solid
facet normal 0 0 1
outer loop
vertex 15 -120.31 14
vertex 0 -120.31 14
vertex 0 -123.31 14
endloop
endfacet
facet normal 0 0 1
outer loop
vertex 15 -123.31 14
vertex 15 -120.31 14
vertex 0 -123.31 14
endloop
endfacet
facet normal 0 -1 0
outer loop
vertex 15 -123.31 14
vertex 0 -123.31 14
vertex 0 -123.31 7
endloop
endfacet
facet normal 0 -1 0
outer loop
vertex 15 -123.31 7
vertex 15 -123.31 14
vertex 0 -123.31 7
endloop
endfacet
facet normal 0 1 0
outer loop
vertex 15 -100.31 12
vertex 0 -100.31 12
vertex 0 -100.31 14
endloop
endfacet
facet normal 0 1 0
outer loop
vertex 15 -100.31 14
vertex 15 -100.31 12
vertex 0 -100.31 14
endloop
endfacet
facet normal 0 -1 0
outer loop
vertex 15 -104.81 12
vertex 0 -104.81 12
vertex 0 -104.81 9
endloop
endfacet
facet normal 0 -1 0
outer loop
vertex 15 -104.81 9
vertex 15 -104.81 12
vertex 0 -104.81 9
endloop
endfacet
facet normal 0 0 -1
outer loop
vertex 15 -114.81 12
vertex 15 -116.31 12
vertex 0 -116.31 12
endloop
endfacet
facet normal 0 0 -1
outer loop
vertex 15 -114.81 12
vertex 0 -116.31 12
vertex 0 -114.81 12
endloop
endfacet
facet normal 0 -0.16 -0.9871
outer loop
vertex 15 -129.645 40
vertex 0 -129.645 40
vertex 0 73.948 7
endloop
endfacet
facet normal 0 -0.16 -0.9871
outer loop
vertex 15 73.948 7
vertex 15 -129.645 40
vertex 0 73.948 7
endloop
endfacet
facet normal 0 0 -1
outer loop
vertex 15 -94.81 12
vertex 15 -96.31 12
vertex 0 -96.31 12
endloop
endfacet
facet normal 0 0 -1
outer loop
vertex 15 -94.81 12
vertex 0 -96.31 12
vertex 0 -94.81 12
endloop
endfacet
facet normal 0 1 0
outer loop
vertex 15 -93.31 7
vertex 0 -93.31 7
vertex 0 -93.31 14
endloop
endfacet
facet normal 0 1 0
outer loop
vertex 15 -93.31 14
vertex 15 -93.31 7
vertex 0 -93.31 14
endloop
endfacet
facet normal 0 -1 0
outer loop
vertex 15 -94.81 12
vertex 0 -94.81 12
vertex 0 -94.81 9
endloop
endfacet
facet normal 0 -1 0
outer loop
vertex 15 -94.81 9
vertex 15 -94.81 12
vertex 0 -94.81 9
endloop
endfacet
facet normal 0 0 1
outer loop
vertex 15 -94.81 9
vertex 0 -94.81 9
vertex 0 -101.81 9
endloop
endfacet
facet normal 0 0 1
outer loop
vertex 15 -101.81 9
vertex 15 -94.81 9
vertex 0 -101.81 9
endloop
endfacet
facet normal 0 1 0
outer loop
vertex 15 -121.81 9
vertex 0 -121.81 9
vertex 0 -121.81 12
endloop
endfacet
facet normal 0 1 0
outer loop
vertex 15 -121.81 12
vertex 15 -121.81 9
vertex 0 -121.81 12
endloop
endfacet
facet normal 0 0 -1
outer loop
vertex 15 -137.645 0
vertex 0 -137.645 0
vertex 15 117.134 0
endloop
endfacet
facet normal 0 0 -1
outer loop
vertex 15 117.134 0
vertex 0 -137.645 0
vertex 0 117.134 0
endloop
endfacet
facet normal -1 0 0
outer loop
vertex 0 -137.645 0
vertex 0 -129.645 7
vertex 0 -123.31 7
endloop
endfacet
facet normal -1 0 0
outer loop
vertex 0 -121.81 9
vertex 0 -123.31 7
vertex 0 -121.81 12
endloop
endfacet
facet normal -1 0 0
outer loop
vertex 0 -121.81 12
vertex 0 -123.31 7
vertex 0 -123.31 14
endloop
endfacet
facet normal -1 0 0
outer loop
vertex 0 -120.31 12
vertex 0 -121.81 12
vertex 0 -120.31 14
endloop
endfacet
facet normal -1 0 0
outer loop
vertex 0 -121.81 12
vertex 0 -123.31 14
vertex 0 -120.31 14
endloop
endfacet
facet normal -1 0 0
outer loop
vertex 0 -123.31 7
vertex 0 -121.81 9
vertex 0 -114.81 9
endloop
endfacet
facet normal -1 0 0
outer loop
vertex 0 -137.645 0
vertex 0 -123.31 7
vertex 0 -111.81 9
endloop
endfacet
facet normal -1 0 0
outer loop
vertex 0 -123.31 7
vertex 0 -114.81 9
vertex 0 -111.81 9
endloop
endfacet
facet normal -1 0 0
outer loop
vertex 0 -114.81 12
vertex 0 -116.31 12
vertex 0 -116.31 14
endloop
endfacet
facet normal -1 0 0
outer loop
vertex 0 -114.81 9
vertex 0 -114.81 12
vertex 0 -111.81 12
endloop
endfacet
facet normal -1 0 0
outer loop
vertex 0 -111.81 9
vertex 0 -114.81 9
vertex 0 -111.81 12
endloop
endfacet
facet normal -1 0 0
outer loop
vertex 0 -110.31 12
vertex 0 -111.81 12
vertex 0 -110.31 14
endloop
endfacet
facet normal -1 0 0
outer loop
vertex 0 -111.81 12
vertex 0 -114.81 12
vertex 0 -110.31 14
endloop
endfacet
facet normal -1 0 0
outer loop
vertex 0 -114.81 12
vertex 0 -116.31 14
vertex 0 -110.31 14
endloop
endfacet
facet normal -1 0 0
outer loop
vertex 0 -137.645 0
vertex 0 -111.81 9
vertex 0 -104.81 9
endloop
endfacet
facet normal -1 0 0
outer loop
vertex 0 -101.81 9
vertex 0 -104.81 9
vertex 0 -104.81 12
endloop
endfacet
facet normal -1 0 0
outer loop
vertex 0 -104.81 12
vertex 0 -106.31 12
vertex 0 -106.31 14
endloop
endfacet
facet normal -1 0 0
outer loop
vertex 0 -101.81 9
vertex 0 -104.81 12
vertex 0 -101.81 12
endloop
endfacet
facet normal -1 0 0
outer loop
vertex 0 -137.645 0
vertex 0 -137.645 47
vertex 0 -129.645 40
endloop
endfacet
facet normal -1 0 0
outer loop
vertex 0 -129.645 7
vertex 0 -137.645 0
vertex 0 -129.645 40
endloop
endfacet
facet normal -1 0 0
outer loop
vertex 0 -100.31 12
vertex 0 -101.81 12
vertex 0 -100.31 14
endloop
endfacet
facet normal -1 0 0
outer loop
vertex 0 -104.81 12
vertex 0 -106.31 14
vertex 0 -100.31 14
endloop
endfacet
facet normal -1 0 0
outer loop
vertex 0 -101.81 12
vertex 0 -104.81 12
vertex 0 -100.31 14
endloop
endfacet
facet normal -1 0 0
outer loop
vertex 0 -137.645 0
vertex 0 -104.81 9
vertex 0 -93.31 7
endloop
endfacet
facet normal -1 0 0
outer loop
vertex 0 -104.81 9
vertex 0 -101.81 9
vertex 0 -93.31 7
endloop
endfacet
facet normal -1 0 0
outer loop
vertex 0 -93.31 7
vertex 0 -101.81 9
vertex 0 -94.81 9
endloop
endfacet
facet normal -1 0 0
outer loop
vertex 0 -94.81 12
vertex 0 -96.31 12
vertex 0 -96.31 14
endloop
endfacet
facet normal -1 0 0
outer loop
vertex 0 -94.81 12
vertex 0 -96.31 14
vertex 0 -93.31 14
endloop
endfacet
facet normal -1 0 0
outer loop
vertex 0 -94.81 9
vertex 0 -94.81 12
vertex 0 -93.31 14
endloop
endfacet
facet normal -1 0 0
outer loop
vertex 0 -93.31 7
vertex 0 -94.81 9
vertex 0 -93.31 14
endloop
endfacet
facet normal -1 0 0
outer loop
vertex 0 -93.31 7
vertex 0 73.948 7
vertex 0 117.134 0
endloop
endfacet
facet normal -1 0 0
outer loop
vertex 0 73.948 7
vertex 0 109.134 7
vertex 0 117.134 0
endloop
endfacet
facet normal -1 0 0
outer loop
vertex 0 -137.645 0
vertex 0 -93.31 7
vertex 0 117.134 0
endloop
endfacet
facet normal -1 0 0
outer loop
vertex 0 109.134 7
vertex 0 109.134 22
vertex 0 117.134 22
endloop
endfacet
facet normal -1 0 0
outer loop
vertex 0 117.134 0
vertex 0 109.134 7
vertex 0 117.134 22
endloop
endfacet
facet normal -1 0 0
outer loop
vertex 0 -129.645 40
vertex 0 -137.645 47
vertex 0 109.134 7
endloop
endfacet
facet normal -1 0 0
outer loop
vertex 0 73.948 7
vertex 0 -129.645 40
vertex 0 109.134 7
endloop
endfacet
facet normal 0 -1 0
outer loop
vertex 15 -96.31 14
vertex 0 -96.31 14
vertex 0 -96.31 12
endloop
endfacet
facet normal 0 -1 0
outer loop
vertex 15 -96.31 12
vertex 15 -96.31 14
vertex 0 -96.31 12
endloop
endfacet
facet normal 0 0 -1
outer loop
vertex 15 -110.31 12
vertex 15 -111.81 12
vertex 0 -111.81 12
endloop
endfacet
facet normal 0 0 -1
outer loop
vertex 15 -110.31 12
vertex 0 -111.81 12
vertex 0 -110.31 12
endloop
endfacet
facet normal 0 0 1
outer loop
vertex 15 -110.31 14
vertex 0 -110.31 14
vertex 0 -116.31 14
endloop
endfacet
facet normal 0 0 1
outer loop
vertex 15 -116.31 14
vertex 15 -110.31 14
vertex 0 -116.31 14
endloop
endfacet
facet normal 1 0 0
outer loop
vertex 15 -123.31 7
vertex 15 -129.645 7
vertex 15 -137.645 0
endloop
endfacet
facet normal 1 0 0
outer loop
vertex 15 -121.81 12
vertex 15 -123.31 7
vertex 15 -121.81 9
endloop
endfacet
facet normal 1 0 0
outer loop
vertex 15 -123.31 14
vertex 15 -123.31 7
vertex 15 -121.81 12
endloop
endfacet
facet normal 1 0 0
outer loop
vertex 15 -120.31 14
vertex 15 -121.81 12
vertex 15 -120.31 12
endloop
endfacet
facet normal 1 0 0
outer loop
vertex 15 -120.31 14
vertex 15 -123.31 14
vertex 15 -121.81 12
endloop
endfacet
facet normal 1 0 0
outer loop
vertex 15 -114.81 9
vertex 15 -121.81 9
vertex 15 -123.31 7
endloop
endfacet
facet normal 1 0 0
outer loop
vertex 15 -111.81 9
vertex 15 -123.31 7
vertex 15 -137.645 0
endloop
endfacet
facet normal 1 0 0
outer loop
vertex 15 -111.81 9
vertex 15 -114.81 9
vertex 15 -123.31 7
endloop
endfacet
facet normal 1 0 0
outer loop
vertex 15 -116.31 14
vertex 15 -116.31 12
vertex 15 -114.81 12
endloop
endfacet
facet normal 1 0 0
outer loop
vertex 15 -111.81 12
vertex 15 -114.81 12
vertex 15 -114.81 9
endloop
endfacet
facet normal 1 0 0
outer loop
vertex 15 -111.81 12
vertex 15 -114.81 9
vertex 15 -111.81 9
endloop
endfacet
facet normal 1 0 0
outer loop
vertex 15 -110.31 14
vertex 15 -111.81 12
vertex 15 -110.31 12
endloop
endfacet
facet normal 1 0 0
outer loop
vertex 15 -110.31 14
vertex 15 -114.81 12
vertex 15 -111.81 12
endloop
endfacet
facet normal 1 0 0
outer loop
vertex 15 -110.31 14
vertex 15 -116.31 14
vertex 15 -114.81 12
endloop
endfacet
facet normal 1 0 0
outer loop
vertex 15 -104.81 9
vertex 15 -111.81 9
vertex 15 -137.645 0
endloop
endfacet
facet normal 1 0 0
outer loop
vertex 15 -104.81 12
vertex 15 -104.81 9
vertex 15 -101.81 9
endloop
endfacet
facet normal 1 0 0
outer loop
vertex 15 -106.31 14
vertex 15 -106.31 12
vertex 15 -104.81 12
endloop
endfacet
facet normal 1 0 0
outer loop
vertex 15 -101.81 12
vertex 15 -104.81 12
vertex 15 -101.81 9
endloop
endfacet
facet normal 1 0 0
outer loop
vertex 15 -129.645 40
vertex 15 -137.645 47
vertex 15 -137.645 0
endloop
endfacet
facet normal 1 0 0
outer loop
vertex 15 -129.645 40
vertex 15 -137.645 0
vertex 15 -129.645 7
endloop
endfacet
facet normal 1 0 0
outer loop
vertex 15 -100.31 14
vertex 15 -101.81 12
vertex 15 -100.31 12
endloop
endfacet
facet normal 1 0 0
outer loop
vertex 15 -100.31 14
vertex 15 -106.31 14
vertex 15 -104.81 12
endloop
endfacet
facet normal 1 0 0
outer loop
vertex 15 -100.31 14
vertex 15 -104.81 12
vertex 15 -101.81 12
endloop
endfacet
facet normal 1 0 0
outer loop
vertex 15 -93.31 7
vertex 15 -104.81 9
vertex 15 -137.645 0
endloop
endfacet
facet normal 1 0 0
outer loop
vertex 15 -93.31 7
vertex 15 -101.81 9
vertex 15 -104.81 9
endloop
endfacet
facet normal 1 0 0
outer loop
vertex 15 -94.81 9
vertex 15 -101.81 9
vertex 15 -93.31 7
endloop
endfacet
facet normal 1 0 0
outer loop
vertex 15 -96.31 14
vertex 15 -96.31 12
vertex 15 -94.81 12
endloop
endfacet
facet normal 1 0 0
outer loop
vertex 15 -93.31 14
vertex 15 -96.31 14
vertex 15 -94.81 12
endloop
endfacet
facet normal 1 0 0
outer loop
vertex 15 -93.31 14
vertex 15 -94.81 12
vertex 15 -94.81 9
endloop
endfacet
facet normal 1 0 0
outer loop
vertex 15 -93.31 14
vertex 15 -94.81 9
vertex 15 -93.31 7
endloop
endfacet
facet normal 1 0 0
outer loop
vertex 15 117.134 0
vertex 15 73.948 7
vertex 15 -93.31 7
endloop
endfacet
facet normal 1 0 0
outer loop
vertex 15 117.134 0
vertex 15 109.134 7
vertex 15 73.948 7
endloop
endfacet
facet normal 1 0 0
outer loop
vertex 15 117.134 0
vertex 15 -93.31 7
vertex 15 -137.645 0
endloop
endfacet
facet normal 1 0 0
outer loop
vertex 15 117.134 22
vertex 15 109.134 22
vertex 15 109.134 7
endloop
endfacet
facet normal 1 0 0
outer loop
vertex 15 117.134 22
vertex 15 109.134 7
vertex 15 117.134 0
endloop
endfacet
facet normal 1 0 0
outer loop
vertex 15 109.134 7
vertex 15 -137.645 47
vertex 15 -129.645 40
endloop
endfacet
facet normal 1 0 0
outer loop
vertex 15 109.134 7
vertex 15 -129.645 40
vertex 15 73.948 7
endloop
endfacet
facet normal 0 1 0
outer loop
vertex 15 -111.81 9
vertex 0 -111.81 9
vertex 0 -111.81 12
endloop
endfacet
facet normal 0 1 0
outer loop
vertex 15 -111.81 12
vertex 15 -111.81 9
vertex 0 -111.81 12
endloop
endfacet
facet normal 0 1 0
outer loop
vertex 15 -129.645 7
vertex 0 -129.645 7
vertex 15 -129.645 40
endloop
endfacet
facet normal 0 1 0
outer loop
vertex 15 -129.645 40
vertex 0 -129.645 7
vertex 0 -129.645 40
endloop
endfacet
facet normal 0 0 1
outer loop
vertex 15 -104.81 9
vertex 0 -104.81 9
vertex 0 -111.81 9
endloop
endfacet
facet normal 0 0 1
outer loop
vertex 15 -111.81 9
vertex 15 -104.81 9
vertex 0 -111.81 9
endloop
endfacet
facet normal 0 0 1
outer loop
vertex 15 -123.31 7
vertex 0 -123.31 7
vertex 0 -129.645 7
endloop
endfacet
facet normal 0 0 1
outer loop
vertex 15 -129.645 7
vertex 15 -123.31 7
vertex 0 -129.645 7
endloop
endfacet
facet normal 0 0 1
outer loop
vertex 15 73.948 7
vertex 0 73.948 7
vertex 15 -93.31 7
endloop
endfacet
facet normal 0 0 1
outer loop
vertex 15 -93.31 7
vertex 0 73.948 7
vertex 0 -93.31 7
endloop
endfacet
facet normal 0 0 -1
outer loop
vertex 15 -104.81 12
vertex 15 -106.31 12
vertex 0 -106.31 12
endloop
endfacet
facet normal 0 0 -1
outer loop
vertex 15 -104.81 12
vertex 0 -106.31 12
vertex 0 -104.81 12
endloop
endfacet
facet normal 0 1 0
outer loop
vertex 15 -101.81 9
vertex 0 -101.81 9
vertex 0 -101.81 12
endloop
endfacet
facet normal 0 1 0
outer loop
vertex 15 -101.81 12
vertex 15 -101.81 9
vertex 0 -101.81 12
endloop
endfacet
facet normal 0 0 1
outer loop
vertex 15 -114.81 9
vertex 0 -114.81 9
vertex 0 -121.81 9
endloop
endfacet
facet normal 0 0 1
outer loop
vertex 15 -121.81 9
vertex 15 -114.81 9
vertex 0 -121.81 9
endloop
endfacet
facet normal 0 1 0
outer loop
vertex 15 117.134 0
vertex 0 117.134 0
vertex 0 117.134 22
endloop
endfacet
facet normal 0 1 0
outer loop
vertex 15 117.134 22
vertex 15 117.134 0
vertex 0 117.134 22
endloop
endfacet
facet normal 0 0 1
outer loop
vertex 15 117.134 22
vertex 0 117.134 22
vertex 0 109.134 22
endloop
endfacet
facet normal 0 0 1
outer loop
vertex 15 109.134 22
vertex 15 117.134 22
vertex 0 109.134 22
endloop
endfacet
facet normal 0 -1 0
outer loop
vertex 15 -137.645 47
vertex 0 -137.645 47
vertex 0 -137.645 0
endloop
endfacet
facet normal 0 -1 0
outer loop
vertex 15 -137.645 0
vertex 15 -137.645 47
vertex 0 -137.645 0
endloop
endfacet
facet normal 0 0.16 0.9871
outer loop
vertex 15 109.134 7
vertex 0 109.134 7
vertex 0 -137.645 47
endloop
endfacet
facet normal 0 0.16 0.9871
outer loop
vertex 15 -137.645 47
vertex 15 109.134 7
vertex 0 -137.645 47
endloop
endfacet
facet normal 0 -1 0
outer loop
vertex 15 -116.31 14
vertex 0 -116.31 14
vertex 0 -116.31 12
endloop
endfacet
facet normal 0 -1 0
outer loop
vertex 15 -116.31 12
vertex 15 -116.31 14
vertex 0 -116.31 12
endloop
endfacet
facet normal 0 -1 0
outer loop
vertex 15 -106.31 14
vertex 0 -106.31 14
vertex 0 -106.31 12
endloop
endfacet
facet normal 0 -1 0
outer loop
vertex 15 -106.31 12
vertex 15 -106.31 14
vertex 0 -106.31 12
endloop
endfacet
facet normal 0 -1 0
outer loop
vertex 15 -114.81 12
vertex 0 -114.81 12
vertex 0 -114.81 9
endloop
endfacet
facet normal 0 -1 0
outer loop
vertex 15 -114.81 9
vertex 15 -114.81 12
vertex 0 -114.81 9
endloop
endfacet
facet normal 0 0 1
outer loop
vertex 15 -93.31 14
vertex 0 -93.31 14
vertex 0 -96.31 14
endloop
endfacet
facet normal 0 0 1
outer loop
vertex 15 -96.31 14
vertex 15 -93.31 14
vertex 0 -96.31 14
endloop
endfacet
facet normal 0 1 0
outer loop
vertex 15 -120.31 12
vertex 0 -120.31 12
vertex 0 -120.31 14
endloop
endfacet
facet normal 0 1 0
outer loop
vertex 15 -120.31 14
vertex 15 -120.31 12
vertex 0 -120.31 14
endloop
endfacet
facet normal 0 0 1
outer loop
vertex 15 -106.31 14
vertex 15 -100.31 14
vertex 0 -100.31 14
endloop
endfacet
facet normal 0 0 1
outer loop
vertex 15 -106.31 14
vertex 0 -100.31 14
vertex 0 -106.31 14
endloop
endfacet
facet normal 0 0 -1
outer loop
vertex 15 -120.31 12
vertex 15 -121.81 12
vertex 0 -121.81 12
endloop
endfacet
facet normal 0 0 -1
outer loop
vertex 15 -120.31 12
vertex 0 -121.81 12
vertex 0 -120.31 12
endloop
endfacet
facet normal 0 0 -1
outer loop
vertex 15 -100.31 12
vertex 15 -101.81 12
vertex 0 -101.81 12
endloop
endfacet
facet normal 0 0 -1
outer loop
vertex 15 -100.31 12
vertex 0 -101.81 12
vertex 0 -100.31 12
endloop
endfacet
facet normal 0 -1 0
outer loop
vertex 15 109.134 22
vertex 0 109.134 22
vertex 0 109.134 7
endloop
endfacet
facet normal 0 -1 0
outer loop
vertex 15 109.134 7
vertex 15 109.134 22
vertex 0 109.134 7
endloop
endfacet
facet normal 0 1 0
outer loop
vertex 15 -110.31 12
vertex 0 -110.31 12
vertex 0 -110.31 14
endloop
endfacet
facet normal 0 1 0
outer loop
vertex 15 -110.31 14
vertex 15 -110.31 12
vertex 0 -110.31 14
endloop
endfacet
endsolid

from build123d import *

# Parameters (mm, degrees)
F1_DEPTH = 15


# Not quite as in the source:
# - ends of sketch curves that miss each other by under 0.0002 mm in the source are joined


with BuildPart() as f1:
    # F0 (on Right) → F1 (new body)
    with BuildSketch(Plane.YZ):
        Polygon((73.9477990592, 7), (117.1341684366, 0), (117.1341684366, 22), (109.1341684366, 22), (109.1341684366, 7), align=None)
        Polygon((-129.6450851485, 0), (117.1341684366, 0), (73.9477990592, 7), (-93.3098772168, 7), (-103.3098761737, 7), (-113.3098740876, 7), (-123.3098730445, 7), (-129.6450851485, 7), align=None)
        Polygon((-129.6450851485, 40), (73.9477990592, 7), (109.1341684366, 7), (-137.6450851485, 47), (-137.6450851485, 0), (-129.6450851485, 0), (-129.6450851485, 7), align=None)
        Polygon((-123.3098730445, 14), (-123.3098730445, 7), (-113.3098740876, 7), (-113.3098730445, 14), (-116.3098730445, 14), (-116.3098730445, 12), (-114.8098730445, 12), (-114.8098730445, 9), (-121.8098730445, 9), (-121.8098730445, 12), (-120.3098730445, 12), (-120.3098730445, 14), align=None)
        Polygon((-113.3098740876, 7), (-103.3098761737, 7), (-103.3098751307, 14), (-106.3098751307, 14), (-106.3098751307, 12), (-104.8098751307, 12), (-104.8098751307, 9), (-111.8098751307, 9), (-111.8098751307, 12), (-110.3098751307, 12), (-110.3098751307, 14), (-113.3098751307, 14), align=None)
        Polygon((-103.3098761737, 7), (-93.3098772168, 7), (-93.3098772168, 14), (-96.3098772168, 14), (-96.3098772168, 12), (-94.8098772168, 12), (-94.8098772168, 9), (-101.8098772168, 9), (-101.8098772168, 12), (-100.3098772168, 12), (-100.3098772168, 14), (-103.3098772168, 14), align=None)
    extrude(amount=F1_DEPTH)


solid = f1.part
